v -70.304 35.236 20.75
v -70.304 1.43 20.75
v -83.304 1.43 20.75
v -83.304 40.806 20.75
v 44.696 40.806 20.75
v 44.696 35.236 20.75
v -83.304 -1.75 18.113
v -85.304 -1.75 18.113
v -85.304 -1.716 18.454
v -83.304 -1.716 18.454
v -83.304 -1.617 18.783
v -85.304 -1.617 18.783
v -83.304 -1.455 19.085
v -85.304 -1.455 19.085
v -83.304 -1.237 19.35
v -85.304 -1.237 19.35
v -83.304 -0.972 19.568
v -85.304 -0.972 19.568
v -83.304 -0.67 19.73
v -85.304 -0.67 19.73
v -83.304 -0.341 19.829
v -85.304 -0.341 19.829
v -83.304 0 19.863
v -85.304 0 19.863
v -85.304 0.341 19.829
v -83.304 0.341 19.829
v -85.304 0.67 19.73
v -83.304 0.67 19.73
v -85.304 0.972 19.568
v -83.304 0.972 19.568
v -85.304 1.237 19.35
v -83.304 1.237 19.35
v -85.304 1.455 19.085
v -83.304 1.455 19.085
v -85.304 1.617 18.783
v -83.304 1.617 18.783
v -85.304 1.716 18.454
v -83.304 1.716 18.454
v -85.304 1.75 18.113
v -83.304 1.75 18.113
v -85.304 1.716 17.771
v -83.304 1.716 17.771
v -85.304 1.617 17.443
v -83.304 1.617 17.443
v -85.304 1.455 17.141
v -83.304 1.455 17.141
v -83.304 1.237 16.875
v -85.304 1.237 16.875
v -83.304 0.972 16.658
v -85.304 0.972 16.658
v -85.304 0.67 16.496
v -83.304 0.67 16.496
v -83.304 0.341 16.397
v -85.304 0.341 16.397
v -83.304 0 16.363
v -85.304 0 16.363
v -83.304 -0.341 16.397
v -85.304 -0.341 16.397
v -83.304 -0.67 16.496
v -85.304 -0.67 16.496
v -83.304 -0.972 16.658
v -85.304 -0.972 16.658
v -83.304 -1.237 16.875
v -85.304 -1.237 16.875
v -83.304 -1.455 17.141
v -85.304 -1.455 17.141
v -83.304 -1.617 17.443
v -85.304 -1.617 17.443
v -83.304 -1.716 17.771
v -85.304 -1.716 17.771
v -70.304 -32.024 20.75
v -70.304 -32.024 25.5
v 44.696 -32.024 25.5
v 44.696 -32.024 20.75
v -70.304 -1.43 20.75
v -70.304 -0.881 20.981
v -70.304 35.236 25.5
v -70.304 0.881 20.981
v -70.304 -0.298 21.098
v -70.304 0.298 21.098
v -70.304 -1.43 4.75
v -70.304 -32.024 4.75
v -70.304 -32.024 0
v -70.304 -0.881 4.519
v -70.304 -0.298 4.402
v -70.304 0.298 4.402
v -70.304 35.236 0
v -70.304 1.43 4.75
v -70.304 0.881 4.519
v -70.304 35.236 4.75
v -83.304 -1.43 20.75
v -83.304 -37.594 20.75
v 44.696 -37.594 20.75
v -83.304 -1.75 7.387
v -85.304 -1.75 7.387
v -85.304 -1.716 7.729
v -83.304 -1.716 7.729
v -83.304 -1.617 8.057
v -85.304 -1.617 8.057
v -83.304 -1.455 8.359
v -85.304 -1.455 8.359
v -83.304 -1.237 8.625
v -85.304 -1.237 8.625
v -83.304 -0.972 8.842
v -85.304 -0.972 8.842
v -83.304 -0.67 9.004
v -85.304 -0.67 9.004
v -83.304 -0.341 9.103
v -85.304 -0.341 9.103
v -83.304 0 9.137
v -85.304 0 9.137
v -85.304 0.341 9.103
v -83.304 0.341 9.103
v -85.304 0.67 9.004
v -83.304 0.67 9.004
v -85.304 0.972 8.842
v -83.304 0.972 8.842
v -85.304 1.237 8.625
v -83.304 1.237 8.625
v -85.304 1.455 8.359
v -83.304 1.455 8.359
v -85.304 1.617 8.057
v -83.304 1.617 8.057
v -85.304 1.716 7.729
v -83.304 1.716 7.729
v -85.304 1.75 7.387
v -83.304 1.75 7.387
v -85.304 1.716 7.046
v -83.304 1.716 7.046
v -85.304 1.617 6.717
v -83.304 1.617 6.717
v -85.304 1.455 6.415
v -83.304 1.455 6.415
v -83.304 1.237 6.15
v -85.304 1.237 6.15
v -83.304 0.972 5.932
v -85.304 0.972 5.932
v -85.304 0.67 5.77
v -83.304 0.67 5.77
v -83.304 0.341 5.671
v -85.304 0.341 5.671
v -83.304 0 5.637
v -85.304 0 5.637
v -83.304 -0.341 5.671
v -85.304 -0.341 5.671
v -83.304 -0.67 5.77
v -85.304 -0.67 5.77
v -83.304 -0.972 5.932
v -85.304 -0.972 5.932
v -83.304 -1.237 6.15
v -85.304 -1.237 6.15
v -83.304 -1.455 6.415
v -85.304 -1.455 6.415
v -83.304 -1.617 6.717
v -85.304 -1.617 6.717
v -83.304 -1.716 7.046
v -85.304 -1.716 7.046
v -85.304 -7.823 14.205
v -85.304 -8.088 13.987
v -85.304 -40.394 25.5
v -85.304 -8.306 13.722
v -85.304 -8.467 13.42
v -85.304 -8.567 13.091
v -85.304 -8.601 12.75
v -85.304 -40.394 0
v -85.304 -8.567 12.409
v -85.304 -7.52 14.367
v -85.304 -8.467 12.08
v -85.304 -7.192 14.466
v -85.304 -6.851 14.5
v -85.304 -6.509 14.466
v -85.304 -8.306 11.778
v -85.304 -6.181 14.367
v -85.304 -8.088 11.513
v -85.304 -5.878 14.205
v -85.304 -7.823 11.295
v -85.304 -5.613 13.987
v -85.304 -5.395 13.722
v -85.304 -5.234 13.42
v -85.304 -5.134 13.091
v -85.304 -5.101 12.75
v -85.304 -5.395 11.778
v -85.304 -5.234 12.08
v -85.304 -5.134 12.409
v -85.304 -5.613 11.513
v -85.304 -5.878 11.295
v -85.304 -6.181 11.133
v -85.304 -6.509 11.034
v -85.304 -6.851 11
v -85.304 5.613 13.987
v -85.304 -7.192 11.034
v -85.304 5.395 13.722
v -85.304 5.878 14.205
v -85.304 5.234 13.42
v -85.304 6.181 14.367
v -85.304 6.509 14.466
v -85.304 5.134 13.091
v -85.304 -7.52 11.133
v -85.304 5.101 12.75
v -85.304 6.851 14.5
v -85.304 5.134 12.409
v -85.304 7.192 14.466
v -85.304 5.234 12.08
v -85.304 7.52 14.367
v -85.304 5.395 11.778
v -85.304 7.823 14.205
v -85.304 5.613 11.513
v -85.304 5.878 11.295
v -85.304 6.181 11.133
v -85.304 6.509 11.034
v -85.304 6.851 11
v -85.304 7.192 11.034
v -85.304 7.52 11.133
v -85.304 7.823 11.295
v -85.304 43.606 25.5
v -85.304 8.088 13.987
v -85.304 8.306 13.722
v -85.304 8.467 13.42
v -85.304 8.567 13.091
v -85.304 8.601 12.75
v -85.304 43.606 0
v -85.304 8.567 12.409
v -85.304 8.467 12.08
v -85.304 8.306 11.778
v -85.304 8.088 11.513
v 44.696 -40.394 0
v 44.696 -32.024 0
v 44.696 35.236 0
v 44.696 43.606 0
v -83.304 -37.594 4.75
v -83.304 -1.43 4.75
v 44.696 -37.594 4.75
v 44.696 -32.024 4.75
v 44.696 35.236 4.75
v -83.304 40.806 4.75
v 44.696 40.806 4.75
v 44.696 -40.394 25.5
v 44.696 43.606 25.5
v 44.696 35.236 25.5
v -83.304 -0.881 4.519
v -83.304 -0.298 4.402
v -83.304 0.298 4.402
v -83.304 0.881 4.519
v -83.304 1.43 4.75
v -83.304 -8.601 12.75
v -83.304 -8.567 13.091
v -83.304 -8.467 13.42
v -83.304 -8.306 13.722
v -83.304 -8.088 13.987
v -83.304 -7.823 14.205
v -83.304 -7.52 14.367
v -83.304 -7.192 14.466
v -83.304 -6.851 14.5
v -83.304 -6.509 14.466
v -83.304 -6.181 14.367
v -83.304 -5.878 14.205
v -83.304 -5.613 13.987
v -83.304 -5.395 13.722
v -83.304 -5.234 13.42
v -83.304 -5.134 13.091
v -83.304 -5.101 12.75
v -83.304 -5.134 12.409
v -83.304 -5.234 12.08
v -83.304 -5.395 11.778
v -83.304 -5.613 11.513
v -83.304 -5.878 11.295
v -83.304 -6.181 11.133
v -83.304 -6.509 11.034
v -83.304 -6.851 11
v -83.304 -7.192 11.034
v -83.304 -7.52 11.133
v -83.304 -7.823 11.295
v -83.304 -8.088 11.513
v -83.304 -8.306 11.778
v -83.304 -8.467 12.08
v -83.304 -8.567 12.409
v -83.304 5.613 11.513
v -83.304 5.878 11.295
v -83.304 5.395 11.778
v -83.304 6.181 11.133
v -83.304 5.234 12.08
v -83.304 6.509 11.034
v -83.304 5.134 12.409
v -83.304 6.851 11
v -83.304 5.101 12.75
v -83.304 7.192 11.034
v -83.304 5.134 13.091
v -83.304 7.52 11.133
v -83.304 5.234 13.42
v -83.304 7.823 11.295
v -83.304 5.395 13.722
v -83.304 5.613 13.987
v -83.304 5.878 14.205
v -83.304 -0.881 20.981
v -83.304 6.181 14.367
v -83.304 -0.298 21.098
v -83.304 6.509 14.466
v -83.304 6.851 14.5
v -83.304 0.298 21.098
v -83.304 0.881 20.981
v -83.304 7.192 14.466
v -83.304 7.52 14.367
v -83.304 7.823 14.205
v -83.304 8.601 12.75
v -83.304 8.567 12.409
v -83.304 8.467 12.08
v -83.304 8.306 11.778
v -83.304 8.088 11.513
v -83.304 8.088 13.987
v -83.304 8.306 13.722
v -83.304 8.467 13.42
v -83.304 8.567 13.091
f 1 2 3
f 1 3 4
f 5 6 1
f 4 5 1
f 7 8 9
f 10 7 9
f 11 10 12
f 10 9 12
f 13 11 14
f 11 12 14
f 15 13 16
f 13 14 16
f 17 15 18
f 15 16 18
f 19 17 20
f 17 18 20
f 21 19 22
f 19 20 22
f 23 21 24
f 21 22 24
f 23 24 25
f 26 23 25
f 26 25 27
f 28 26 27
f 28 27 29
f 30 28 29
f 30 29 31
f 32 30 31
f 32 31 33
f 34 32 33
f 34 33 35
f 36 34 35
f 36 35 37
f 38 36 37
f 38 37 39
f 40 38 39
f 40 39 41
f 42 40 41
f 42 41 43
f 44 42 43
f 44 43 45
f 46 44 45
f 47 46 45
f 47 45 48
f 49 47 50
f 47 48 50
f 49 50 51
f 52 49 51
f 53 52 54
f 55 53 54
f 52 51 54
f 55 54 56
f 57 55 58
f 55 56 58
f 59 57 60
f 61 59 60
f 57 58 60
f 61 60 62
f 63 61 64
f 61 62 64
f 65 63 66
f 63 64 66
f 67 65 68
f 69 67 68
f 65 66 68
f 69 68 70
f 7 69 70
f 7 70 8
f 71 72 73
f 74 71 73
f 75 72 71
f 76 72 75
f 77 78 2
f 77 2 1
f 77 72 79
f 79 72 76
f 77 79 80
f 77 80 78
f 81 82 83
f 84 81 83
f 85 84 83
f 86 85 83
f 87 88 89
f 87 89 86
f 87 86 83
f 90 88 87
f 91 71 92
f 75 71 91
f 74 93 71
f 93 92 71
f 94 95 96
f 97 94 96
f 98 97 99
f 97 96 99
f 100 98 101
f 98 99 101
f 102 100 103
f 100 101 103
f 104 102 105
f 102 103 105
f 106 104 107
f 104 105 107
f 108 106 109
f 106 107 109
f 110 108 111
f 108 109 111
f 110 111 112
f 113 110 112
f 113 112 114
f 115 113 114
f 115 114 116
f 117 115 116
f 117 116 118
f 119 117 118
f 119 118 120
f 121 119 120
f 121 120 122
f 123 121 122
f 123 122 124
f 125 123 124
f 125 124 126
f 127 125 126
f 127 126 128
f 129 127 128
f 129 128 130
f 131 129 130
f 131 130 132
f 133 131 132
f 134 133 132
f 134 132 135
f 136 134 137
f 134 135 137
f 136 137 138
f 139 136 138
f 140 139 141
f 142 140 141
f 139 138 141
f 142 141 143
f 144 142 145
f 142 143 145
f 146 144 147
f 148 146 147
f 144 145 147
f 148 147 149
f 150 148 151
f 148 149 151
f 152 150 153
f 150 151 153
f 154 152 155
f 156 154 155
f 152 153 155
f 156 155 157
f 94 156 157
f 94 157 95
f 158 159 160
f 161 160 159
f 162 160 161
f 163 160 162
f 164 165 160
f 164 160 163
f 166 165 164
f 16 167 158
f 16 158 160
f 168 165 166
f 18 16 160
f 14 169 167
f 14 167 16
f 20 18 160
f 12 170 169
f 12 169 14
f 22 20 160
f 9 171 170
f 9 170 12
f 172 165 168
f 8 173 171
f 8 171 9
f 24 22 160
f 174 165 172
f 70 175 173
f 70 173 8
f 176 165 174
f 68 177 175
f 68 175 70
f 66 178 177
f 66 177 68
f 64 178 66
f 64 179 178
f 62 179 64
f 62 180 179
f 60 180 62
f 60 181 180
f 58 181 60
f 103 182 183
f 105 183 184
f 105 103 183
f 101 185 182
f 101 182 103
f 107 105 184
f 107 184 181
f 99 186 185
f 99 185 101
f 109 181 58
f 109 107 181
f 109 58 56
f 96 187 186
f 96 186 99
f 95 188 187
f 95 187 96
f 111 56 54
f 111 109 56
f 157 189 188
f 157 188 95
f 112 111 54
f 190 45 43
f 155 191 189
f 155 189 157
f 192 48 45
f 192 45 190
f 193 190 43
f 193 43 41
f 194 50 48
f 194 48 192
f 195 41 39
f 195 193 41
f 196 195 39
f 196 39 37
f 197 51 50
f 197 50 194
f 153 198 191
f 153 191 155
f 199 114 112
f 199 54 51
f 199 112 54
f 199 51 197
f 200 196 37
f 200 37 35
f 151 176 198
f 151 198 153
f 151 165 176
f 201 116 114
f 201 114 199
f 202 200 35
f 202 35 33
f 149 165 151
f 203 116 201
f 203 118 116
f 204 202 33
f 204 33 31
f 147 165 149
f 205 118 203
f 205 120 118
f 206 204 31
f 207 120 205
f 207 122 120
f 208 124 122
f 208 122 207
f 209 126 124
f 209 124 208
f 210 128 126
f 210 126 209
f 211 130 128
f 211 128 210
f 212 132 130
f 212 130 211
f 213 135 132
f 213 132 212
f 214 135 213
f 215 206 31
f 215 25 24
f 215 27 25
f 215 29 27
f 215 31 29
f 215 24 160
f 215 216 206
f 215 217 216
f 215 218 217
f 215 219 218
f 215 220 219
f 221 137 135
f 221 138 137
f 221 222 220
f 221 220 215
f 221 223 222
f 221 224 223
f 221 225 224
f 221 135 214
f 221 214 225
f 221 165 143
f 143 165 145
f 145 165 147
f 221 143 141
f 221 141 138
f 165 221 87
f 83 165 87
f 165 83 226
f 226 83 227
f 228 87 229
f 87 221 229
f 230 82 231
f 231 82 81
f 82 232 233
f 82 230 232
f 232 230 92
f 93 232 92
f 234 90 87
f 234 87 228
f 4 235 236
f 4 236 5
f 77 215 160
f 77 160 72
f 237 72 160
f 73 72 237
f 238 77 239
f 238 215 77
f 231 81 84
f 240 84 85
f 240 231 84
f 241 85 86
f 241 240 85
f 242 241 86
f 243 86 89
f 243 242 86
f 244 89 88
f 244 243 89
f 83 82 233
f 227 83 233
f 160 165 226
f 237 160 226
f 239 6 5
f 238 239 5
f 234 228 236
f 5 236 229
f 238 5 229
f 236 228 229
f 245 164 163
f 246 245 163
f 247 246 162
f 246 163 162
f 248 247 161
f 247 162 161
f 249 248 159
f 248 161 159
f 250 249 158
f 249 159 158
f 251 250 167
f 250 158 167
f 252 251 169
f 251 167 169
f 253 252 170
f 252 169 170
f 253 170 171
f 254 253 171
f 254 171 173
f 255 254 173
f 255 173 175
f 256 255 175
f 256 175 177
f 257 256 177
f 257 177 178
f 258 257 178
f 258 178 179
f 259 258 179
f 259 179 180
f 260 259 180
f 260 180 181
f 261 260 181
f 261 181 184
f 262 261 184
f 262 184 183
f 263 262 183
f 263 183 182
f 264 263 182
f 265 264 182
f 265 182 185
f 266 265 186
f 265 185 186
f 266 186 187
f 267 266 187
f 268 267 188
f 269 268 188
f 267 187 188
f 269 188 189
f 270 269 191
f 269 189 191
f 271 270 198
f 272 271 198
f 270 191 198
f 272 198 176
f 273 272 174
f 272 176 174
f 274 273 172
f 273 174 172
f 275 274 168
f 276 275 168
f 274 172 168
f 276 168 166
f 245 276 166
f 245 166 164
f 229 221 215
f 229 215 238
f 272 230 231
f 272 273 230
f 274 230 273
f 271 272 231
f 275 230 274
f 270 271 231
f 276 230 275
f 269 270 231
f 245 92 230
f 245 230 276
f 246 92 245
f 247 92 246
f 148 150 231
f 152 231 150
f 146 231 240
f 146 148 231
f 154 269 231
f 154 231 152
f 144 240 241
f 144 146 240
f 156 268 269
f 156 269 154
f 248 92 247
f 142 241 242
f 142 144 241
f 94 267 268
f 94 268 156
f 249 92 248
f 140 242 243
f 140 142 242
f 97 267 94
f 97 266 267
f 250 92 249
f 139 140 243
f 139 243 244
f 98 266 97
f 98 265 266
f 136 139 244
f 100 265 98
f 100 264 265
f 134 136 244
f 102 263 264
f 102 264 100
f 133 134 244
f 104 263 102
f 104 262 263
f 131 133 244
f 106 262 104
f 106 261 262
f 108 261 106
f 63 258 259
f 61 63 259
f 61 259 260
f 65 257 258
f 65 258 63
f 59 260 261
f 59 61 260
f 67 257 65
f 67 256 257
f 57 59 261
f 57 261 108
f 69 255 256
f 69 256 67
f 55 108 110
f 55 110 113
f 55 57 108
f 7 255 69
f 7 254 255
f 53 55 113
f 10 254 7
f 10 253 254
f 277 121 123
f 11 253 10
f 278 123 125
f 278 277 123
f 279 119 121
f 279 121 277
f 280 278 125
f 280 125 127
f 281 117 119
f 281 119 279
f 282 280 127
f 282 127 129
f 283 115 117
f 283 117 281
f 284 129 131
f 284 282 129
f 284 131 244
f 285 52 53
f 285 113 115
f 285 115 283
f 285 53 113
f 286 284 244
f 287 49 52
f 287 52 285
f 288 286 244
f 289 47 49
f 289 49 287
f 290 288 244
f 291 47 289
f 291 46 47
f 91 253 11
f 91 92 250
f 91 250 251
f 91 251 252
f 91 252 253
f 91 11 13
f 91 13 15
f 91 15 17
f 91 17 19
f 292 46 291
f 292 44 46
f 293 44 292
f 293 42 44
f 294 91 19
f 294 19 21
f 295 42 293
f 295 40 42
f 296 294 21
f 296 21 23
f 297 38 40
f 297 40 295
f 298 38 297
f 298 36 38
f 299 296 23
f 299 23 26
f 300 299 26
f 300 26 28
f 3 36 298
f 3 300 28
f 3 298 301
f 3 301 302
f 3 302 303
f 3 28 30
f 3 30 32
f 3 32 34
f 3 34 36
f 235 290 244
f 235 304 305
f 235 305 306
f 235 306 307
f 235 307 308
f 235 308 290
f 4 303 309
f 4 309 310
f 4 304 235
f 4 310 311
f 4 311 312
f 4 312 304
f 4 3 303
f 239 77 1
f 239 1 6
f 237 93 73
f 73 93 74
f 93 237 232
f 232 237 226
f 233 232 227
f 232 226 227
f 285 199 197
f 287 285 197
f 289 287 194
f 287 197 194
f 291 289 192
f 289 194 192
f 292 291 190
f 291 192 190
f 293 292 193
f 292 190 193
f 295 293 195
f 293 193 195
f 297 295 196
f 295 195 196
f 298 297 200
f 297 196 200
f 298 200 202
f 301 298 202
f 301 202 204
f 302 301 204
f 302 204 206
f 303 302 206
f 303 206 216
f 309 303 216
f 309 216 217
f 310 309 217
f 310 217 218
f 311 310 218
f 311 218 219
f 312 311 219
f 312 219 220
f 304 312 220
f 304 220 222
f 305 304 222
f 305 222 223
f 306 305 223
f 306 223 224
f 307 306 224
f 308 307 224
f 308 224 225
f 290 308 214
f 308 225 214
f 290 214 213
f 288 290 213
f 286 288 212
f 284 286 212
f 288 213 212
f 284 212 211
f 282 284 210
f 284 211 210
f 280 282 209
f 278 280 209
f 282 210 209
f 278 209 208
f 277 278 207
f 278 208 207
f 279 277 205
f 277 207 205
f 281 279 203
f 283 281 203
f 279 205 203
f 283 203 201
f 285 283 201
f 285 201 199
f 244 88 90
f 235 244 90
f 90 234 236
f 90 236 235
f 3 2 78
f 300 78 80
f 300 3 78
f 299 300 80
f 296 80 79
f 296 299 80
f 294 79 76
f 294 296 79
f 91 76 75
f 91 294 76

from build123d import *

# Parameters (mm, degrees)
F0_W      = 130
F0_H      = 84
F1_DEPTH  = 25.5
F2_W      = 78.4
F2_H      = 16
F3_DEPTH  = 128
F4_W      = 115
F4_H      = 67.26
F5_DEPTH  = 25.501
F6_R      = 1.75
F7_DEPTH  = 130.001
F9_R      = 3
F10_DEPTH = 25
F11_R     = 3
F12_DEPTH = 25


with BuildPart() as f1:
    # F0 (on Top) → F1 (new body)
    with BuildSketch(Plane.XY):
        with Locations((-20.303967, 1.606347)):
            Rectangle(F0_W, F0_H)
    extrude(amount=F1_DEPTH)

    # F2 (on face) → F3 (cut)
    with BuildSketch(Plane.YZ.offset(44.696033)):
        with Locations((1.606347, 12.75)):
            Rectangle(F2_W, F2_H)
    extrude(amount=-F3_DEPTH, mode=Mode.SUBTRACT)

    # F4 (on face) → F5 (cut, through all)
    with BuildSketch(Plane.XY.offset(25.5)):
        with Locations((-12.803967, 1.606347)):
            Rectangle(F4_W, F4_H)
    extrude(amount=-F5_DEPTH, mode=Mode.SUBTRACT)

    # F6 (on face) → F7 (cut, through all)
    with BuildSketch(Plane(origin=(-85.303967, 0, 0), x_dir=(0, -1, 0), z_dir=(-1, 0, 0))):
        with Locations((0, 18.112885)):
            Circle(F6_R)
        with Locations((0, 7.387115)):
            Circle(F6_R)
        with Locations((-6.850508, 12.75)):
            Circle(F6_R)
        with Locations((6.850508, 12.75)):
            Circle(F6_R)
    extrude(amount=-F7_DEPTH, mode=Mode.SUBTRACT)

    # F9 (on face) → F10 (cut)
    with BuildSketch(Plane.YZ.offset(-83.303967)):
        with Locations((0, 18.112885)):
            Circle(F9_R)
    extrude(amount=F10_DEPTH, mode=Mode.SUBTRACT)

    # F11 (on face) → F12 (cut)
    with BuildSketch(Plane.YZ.offset(-83.303967)):
        with Locations((0, 7.387115)):
            Circle(F11_R)
    extrude(amount=F12_DEPTH, mode=Mode.SUBTRACT)


solid = f1.part
